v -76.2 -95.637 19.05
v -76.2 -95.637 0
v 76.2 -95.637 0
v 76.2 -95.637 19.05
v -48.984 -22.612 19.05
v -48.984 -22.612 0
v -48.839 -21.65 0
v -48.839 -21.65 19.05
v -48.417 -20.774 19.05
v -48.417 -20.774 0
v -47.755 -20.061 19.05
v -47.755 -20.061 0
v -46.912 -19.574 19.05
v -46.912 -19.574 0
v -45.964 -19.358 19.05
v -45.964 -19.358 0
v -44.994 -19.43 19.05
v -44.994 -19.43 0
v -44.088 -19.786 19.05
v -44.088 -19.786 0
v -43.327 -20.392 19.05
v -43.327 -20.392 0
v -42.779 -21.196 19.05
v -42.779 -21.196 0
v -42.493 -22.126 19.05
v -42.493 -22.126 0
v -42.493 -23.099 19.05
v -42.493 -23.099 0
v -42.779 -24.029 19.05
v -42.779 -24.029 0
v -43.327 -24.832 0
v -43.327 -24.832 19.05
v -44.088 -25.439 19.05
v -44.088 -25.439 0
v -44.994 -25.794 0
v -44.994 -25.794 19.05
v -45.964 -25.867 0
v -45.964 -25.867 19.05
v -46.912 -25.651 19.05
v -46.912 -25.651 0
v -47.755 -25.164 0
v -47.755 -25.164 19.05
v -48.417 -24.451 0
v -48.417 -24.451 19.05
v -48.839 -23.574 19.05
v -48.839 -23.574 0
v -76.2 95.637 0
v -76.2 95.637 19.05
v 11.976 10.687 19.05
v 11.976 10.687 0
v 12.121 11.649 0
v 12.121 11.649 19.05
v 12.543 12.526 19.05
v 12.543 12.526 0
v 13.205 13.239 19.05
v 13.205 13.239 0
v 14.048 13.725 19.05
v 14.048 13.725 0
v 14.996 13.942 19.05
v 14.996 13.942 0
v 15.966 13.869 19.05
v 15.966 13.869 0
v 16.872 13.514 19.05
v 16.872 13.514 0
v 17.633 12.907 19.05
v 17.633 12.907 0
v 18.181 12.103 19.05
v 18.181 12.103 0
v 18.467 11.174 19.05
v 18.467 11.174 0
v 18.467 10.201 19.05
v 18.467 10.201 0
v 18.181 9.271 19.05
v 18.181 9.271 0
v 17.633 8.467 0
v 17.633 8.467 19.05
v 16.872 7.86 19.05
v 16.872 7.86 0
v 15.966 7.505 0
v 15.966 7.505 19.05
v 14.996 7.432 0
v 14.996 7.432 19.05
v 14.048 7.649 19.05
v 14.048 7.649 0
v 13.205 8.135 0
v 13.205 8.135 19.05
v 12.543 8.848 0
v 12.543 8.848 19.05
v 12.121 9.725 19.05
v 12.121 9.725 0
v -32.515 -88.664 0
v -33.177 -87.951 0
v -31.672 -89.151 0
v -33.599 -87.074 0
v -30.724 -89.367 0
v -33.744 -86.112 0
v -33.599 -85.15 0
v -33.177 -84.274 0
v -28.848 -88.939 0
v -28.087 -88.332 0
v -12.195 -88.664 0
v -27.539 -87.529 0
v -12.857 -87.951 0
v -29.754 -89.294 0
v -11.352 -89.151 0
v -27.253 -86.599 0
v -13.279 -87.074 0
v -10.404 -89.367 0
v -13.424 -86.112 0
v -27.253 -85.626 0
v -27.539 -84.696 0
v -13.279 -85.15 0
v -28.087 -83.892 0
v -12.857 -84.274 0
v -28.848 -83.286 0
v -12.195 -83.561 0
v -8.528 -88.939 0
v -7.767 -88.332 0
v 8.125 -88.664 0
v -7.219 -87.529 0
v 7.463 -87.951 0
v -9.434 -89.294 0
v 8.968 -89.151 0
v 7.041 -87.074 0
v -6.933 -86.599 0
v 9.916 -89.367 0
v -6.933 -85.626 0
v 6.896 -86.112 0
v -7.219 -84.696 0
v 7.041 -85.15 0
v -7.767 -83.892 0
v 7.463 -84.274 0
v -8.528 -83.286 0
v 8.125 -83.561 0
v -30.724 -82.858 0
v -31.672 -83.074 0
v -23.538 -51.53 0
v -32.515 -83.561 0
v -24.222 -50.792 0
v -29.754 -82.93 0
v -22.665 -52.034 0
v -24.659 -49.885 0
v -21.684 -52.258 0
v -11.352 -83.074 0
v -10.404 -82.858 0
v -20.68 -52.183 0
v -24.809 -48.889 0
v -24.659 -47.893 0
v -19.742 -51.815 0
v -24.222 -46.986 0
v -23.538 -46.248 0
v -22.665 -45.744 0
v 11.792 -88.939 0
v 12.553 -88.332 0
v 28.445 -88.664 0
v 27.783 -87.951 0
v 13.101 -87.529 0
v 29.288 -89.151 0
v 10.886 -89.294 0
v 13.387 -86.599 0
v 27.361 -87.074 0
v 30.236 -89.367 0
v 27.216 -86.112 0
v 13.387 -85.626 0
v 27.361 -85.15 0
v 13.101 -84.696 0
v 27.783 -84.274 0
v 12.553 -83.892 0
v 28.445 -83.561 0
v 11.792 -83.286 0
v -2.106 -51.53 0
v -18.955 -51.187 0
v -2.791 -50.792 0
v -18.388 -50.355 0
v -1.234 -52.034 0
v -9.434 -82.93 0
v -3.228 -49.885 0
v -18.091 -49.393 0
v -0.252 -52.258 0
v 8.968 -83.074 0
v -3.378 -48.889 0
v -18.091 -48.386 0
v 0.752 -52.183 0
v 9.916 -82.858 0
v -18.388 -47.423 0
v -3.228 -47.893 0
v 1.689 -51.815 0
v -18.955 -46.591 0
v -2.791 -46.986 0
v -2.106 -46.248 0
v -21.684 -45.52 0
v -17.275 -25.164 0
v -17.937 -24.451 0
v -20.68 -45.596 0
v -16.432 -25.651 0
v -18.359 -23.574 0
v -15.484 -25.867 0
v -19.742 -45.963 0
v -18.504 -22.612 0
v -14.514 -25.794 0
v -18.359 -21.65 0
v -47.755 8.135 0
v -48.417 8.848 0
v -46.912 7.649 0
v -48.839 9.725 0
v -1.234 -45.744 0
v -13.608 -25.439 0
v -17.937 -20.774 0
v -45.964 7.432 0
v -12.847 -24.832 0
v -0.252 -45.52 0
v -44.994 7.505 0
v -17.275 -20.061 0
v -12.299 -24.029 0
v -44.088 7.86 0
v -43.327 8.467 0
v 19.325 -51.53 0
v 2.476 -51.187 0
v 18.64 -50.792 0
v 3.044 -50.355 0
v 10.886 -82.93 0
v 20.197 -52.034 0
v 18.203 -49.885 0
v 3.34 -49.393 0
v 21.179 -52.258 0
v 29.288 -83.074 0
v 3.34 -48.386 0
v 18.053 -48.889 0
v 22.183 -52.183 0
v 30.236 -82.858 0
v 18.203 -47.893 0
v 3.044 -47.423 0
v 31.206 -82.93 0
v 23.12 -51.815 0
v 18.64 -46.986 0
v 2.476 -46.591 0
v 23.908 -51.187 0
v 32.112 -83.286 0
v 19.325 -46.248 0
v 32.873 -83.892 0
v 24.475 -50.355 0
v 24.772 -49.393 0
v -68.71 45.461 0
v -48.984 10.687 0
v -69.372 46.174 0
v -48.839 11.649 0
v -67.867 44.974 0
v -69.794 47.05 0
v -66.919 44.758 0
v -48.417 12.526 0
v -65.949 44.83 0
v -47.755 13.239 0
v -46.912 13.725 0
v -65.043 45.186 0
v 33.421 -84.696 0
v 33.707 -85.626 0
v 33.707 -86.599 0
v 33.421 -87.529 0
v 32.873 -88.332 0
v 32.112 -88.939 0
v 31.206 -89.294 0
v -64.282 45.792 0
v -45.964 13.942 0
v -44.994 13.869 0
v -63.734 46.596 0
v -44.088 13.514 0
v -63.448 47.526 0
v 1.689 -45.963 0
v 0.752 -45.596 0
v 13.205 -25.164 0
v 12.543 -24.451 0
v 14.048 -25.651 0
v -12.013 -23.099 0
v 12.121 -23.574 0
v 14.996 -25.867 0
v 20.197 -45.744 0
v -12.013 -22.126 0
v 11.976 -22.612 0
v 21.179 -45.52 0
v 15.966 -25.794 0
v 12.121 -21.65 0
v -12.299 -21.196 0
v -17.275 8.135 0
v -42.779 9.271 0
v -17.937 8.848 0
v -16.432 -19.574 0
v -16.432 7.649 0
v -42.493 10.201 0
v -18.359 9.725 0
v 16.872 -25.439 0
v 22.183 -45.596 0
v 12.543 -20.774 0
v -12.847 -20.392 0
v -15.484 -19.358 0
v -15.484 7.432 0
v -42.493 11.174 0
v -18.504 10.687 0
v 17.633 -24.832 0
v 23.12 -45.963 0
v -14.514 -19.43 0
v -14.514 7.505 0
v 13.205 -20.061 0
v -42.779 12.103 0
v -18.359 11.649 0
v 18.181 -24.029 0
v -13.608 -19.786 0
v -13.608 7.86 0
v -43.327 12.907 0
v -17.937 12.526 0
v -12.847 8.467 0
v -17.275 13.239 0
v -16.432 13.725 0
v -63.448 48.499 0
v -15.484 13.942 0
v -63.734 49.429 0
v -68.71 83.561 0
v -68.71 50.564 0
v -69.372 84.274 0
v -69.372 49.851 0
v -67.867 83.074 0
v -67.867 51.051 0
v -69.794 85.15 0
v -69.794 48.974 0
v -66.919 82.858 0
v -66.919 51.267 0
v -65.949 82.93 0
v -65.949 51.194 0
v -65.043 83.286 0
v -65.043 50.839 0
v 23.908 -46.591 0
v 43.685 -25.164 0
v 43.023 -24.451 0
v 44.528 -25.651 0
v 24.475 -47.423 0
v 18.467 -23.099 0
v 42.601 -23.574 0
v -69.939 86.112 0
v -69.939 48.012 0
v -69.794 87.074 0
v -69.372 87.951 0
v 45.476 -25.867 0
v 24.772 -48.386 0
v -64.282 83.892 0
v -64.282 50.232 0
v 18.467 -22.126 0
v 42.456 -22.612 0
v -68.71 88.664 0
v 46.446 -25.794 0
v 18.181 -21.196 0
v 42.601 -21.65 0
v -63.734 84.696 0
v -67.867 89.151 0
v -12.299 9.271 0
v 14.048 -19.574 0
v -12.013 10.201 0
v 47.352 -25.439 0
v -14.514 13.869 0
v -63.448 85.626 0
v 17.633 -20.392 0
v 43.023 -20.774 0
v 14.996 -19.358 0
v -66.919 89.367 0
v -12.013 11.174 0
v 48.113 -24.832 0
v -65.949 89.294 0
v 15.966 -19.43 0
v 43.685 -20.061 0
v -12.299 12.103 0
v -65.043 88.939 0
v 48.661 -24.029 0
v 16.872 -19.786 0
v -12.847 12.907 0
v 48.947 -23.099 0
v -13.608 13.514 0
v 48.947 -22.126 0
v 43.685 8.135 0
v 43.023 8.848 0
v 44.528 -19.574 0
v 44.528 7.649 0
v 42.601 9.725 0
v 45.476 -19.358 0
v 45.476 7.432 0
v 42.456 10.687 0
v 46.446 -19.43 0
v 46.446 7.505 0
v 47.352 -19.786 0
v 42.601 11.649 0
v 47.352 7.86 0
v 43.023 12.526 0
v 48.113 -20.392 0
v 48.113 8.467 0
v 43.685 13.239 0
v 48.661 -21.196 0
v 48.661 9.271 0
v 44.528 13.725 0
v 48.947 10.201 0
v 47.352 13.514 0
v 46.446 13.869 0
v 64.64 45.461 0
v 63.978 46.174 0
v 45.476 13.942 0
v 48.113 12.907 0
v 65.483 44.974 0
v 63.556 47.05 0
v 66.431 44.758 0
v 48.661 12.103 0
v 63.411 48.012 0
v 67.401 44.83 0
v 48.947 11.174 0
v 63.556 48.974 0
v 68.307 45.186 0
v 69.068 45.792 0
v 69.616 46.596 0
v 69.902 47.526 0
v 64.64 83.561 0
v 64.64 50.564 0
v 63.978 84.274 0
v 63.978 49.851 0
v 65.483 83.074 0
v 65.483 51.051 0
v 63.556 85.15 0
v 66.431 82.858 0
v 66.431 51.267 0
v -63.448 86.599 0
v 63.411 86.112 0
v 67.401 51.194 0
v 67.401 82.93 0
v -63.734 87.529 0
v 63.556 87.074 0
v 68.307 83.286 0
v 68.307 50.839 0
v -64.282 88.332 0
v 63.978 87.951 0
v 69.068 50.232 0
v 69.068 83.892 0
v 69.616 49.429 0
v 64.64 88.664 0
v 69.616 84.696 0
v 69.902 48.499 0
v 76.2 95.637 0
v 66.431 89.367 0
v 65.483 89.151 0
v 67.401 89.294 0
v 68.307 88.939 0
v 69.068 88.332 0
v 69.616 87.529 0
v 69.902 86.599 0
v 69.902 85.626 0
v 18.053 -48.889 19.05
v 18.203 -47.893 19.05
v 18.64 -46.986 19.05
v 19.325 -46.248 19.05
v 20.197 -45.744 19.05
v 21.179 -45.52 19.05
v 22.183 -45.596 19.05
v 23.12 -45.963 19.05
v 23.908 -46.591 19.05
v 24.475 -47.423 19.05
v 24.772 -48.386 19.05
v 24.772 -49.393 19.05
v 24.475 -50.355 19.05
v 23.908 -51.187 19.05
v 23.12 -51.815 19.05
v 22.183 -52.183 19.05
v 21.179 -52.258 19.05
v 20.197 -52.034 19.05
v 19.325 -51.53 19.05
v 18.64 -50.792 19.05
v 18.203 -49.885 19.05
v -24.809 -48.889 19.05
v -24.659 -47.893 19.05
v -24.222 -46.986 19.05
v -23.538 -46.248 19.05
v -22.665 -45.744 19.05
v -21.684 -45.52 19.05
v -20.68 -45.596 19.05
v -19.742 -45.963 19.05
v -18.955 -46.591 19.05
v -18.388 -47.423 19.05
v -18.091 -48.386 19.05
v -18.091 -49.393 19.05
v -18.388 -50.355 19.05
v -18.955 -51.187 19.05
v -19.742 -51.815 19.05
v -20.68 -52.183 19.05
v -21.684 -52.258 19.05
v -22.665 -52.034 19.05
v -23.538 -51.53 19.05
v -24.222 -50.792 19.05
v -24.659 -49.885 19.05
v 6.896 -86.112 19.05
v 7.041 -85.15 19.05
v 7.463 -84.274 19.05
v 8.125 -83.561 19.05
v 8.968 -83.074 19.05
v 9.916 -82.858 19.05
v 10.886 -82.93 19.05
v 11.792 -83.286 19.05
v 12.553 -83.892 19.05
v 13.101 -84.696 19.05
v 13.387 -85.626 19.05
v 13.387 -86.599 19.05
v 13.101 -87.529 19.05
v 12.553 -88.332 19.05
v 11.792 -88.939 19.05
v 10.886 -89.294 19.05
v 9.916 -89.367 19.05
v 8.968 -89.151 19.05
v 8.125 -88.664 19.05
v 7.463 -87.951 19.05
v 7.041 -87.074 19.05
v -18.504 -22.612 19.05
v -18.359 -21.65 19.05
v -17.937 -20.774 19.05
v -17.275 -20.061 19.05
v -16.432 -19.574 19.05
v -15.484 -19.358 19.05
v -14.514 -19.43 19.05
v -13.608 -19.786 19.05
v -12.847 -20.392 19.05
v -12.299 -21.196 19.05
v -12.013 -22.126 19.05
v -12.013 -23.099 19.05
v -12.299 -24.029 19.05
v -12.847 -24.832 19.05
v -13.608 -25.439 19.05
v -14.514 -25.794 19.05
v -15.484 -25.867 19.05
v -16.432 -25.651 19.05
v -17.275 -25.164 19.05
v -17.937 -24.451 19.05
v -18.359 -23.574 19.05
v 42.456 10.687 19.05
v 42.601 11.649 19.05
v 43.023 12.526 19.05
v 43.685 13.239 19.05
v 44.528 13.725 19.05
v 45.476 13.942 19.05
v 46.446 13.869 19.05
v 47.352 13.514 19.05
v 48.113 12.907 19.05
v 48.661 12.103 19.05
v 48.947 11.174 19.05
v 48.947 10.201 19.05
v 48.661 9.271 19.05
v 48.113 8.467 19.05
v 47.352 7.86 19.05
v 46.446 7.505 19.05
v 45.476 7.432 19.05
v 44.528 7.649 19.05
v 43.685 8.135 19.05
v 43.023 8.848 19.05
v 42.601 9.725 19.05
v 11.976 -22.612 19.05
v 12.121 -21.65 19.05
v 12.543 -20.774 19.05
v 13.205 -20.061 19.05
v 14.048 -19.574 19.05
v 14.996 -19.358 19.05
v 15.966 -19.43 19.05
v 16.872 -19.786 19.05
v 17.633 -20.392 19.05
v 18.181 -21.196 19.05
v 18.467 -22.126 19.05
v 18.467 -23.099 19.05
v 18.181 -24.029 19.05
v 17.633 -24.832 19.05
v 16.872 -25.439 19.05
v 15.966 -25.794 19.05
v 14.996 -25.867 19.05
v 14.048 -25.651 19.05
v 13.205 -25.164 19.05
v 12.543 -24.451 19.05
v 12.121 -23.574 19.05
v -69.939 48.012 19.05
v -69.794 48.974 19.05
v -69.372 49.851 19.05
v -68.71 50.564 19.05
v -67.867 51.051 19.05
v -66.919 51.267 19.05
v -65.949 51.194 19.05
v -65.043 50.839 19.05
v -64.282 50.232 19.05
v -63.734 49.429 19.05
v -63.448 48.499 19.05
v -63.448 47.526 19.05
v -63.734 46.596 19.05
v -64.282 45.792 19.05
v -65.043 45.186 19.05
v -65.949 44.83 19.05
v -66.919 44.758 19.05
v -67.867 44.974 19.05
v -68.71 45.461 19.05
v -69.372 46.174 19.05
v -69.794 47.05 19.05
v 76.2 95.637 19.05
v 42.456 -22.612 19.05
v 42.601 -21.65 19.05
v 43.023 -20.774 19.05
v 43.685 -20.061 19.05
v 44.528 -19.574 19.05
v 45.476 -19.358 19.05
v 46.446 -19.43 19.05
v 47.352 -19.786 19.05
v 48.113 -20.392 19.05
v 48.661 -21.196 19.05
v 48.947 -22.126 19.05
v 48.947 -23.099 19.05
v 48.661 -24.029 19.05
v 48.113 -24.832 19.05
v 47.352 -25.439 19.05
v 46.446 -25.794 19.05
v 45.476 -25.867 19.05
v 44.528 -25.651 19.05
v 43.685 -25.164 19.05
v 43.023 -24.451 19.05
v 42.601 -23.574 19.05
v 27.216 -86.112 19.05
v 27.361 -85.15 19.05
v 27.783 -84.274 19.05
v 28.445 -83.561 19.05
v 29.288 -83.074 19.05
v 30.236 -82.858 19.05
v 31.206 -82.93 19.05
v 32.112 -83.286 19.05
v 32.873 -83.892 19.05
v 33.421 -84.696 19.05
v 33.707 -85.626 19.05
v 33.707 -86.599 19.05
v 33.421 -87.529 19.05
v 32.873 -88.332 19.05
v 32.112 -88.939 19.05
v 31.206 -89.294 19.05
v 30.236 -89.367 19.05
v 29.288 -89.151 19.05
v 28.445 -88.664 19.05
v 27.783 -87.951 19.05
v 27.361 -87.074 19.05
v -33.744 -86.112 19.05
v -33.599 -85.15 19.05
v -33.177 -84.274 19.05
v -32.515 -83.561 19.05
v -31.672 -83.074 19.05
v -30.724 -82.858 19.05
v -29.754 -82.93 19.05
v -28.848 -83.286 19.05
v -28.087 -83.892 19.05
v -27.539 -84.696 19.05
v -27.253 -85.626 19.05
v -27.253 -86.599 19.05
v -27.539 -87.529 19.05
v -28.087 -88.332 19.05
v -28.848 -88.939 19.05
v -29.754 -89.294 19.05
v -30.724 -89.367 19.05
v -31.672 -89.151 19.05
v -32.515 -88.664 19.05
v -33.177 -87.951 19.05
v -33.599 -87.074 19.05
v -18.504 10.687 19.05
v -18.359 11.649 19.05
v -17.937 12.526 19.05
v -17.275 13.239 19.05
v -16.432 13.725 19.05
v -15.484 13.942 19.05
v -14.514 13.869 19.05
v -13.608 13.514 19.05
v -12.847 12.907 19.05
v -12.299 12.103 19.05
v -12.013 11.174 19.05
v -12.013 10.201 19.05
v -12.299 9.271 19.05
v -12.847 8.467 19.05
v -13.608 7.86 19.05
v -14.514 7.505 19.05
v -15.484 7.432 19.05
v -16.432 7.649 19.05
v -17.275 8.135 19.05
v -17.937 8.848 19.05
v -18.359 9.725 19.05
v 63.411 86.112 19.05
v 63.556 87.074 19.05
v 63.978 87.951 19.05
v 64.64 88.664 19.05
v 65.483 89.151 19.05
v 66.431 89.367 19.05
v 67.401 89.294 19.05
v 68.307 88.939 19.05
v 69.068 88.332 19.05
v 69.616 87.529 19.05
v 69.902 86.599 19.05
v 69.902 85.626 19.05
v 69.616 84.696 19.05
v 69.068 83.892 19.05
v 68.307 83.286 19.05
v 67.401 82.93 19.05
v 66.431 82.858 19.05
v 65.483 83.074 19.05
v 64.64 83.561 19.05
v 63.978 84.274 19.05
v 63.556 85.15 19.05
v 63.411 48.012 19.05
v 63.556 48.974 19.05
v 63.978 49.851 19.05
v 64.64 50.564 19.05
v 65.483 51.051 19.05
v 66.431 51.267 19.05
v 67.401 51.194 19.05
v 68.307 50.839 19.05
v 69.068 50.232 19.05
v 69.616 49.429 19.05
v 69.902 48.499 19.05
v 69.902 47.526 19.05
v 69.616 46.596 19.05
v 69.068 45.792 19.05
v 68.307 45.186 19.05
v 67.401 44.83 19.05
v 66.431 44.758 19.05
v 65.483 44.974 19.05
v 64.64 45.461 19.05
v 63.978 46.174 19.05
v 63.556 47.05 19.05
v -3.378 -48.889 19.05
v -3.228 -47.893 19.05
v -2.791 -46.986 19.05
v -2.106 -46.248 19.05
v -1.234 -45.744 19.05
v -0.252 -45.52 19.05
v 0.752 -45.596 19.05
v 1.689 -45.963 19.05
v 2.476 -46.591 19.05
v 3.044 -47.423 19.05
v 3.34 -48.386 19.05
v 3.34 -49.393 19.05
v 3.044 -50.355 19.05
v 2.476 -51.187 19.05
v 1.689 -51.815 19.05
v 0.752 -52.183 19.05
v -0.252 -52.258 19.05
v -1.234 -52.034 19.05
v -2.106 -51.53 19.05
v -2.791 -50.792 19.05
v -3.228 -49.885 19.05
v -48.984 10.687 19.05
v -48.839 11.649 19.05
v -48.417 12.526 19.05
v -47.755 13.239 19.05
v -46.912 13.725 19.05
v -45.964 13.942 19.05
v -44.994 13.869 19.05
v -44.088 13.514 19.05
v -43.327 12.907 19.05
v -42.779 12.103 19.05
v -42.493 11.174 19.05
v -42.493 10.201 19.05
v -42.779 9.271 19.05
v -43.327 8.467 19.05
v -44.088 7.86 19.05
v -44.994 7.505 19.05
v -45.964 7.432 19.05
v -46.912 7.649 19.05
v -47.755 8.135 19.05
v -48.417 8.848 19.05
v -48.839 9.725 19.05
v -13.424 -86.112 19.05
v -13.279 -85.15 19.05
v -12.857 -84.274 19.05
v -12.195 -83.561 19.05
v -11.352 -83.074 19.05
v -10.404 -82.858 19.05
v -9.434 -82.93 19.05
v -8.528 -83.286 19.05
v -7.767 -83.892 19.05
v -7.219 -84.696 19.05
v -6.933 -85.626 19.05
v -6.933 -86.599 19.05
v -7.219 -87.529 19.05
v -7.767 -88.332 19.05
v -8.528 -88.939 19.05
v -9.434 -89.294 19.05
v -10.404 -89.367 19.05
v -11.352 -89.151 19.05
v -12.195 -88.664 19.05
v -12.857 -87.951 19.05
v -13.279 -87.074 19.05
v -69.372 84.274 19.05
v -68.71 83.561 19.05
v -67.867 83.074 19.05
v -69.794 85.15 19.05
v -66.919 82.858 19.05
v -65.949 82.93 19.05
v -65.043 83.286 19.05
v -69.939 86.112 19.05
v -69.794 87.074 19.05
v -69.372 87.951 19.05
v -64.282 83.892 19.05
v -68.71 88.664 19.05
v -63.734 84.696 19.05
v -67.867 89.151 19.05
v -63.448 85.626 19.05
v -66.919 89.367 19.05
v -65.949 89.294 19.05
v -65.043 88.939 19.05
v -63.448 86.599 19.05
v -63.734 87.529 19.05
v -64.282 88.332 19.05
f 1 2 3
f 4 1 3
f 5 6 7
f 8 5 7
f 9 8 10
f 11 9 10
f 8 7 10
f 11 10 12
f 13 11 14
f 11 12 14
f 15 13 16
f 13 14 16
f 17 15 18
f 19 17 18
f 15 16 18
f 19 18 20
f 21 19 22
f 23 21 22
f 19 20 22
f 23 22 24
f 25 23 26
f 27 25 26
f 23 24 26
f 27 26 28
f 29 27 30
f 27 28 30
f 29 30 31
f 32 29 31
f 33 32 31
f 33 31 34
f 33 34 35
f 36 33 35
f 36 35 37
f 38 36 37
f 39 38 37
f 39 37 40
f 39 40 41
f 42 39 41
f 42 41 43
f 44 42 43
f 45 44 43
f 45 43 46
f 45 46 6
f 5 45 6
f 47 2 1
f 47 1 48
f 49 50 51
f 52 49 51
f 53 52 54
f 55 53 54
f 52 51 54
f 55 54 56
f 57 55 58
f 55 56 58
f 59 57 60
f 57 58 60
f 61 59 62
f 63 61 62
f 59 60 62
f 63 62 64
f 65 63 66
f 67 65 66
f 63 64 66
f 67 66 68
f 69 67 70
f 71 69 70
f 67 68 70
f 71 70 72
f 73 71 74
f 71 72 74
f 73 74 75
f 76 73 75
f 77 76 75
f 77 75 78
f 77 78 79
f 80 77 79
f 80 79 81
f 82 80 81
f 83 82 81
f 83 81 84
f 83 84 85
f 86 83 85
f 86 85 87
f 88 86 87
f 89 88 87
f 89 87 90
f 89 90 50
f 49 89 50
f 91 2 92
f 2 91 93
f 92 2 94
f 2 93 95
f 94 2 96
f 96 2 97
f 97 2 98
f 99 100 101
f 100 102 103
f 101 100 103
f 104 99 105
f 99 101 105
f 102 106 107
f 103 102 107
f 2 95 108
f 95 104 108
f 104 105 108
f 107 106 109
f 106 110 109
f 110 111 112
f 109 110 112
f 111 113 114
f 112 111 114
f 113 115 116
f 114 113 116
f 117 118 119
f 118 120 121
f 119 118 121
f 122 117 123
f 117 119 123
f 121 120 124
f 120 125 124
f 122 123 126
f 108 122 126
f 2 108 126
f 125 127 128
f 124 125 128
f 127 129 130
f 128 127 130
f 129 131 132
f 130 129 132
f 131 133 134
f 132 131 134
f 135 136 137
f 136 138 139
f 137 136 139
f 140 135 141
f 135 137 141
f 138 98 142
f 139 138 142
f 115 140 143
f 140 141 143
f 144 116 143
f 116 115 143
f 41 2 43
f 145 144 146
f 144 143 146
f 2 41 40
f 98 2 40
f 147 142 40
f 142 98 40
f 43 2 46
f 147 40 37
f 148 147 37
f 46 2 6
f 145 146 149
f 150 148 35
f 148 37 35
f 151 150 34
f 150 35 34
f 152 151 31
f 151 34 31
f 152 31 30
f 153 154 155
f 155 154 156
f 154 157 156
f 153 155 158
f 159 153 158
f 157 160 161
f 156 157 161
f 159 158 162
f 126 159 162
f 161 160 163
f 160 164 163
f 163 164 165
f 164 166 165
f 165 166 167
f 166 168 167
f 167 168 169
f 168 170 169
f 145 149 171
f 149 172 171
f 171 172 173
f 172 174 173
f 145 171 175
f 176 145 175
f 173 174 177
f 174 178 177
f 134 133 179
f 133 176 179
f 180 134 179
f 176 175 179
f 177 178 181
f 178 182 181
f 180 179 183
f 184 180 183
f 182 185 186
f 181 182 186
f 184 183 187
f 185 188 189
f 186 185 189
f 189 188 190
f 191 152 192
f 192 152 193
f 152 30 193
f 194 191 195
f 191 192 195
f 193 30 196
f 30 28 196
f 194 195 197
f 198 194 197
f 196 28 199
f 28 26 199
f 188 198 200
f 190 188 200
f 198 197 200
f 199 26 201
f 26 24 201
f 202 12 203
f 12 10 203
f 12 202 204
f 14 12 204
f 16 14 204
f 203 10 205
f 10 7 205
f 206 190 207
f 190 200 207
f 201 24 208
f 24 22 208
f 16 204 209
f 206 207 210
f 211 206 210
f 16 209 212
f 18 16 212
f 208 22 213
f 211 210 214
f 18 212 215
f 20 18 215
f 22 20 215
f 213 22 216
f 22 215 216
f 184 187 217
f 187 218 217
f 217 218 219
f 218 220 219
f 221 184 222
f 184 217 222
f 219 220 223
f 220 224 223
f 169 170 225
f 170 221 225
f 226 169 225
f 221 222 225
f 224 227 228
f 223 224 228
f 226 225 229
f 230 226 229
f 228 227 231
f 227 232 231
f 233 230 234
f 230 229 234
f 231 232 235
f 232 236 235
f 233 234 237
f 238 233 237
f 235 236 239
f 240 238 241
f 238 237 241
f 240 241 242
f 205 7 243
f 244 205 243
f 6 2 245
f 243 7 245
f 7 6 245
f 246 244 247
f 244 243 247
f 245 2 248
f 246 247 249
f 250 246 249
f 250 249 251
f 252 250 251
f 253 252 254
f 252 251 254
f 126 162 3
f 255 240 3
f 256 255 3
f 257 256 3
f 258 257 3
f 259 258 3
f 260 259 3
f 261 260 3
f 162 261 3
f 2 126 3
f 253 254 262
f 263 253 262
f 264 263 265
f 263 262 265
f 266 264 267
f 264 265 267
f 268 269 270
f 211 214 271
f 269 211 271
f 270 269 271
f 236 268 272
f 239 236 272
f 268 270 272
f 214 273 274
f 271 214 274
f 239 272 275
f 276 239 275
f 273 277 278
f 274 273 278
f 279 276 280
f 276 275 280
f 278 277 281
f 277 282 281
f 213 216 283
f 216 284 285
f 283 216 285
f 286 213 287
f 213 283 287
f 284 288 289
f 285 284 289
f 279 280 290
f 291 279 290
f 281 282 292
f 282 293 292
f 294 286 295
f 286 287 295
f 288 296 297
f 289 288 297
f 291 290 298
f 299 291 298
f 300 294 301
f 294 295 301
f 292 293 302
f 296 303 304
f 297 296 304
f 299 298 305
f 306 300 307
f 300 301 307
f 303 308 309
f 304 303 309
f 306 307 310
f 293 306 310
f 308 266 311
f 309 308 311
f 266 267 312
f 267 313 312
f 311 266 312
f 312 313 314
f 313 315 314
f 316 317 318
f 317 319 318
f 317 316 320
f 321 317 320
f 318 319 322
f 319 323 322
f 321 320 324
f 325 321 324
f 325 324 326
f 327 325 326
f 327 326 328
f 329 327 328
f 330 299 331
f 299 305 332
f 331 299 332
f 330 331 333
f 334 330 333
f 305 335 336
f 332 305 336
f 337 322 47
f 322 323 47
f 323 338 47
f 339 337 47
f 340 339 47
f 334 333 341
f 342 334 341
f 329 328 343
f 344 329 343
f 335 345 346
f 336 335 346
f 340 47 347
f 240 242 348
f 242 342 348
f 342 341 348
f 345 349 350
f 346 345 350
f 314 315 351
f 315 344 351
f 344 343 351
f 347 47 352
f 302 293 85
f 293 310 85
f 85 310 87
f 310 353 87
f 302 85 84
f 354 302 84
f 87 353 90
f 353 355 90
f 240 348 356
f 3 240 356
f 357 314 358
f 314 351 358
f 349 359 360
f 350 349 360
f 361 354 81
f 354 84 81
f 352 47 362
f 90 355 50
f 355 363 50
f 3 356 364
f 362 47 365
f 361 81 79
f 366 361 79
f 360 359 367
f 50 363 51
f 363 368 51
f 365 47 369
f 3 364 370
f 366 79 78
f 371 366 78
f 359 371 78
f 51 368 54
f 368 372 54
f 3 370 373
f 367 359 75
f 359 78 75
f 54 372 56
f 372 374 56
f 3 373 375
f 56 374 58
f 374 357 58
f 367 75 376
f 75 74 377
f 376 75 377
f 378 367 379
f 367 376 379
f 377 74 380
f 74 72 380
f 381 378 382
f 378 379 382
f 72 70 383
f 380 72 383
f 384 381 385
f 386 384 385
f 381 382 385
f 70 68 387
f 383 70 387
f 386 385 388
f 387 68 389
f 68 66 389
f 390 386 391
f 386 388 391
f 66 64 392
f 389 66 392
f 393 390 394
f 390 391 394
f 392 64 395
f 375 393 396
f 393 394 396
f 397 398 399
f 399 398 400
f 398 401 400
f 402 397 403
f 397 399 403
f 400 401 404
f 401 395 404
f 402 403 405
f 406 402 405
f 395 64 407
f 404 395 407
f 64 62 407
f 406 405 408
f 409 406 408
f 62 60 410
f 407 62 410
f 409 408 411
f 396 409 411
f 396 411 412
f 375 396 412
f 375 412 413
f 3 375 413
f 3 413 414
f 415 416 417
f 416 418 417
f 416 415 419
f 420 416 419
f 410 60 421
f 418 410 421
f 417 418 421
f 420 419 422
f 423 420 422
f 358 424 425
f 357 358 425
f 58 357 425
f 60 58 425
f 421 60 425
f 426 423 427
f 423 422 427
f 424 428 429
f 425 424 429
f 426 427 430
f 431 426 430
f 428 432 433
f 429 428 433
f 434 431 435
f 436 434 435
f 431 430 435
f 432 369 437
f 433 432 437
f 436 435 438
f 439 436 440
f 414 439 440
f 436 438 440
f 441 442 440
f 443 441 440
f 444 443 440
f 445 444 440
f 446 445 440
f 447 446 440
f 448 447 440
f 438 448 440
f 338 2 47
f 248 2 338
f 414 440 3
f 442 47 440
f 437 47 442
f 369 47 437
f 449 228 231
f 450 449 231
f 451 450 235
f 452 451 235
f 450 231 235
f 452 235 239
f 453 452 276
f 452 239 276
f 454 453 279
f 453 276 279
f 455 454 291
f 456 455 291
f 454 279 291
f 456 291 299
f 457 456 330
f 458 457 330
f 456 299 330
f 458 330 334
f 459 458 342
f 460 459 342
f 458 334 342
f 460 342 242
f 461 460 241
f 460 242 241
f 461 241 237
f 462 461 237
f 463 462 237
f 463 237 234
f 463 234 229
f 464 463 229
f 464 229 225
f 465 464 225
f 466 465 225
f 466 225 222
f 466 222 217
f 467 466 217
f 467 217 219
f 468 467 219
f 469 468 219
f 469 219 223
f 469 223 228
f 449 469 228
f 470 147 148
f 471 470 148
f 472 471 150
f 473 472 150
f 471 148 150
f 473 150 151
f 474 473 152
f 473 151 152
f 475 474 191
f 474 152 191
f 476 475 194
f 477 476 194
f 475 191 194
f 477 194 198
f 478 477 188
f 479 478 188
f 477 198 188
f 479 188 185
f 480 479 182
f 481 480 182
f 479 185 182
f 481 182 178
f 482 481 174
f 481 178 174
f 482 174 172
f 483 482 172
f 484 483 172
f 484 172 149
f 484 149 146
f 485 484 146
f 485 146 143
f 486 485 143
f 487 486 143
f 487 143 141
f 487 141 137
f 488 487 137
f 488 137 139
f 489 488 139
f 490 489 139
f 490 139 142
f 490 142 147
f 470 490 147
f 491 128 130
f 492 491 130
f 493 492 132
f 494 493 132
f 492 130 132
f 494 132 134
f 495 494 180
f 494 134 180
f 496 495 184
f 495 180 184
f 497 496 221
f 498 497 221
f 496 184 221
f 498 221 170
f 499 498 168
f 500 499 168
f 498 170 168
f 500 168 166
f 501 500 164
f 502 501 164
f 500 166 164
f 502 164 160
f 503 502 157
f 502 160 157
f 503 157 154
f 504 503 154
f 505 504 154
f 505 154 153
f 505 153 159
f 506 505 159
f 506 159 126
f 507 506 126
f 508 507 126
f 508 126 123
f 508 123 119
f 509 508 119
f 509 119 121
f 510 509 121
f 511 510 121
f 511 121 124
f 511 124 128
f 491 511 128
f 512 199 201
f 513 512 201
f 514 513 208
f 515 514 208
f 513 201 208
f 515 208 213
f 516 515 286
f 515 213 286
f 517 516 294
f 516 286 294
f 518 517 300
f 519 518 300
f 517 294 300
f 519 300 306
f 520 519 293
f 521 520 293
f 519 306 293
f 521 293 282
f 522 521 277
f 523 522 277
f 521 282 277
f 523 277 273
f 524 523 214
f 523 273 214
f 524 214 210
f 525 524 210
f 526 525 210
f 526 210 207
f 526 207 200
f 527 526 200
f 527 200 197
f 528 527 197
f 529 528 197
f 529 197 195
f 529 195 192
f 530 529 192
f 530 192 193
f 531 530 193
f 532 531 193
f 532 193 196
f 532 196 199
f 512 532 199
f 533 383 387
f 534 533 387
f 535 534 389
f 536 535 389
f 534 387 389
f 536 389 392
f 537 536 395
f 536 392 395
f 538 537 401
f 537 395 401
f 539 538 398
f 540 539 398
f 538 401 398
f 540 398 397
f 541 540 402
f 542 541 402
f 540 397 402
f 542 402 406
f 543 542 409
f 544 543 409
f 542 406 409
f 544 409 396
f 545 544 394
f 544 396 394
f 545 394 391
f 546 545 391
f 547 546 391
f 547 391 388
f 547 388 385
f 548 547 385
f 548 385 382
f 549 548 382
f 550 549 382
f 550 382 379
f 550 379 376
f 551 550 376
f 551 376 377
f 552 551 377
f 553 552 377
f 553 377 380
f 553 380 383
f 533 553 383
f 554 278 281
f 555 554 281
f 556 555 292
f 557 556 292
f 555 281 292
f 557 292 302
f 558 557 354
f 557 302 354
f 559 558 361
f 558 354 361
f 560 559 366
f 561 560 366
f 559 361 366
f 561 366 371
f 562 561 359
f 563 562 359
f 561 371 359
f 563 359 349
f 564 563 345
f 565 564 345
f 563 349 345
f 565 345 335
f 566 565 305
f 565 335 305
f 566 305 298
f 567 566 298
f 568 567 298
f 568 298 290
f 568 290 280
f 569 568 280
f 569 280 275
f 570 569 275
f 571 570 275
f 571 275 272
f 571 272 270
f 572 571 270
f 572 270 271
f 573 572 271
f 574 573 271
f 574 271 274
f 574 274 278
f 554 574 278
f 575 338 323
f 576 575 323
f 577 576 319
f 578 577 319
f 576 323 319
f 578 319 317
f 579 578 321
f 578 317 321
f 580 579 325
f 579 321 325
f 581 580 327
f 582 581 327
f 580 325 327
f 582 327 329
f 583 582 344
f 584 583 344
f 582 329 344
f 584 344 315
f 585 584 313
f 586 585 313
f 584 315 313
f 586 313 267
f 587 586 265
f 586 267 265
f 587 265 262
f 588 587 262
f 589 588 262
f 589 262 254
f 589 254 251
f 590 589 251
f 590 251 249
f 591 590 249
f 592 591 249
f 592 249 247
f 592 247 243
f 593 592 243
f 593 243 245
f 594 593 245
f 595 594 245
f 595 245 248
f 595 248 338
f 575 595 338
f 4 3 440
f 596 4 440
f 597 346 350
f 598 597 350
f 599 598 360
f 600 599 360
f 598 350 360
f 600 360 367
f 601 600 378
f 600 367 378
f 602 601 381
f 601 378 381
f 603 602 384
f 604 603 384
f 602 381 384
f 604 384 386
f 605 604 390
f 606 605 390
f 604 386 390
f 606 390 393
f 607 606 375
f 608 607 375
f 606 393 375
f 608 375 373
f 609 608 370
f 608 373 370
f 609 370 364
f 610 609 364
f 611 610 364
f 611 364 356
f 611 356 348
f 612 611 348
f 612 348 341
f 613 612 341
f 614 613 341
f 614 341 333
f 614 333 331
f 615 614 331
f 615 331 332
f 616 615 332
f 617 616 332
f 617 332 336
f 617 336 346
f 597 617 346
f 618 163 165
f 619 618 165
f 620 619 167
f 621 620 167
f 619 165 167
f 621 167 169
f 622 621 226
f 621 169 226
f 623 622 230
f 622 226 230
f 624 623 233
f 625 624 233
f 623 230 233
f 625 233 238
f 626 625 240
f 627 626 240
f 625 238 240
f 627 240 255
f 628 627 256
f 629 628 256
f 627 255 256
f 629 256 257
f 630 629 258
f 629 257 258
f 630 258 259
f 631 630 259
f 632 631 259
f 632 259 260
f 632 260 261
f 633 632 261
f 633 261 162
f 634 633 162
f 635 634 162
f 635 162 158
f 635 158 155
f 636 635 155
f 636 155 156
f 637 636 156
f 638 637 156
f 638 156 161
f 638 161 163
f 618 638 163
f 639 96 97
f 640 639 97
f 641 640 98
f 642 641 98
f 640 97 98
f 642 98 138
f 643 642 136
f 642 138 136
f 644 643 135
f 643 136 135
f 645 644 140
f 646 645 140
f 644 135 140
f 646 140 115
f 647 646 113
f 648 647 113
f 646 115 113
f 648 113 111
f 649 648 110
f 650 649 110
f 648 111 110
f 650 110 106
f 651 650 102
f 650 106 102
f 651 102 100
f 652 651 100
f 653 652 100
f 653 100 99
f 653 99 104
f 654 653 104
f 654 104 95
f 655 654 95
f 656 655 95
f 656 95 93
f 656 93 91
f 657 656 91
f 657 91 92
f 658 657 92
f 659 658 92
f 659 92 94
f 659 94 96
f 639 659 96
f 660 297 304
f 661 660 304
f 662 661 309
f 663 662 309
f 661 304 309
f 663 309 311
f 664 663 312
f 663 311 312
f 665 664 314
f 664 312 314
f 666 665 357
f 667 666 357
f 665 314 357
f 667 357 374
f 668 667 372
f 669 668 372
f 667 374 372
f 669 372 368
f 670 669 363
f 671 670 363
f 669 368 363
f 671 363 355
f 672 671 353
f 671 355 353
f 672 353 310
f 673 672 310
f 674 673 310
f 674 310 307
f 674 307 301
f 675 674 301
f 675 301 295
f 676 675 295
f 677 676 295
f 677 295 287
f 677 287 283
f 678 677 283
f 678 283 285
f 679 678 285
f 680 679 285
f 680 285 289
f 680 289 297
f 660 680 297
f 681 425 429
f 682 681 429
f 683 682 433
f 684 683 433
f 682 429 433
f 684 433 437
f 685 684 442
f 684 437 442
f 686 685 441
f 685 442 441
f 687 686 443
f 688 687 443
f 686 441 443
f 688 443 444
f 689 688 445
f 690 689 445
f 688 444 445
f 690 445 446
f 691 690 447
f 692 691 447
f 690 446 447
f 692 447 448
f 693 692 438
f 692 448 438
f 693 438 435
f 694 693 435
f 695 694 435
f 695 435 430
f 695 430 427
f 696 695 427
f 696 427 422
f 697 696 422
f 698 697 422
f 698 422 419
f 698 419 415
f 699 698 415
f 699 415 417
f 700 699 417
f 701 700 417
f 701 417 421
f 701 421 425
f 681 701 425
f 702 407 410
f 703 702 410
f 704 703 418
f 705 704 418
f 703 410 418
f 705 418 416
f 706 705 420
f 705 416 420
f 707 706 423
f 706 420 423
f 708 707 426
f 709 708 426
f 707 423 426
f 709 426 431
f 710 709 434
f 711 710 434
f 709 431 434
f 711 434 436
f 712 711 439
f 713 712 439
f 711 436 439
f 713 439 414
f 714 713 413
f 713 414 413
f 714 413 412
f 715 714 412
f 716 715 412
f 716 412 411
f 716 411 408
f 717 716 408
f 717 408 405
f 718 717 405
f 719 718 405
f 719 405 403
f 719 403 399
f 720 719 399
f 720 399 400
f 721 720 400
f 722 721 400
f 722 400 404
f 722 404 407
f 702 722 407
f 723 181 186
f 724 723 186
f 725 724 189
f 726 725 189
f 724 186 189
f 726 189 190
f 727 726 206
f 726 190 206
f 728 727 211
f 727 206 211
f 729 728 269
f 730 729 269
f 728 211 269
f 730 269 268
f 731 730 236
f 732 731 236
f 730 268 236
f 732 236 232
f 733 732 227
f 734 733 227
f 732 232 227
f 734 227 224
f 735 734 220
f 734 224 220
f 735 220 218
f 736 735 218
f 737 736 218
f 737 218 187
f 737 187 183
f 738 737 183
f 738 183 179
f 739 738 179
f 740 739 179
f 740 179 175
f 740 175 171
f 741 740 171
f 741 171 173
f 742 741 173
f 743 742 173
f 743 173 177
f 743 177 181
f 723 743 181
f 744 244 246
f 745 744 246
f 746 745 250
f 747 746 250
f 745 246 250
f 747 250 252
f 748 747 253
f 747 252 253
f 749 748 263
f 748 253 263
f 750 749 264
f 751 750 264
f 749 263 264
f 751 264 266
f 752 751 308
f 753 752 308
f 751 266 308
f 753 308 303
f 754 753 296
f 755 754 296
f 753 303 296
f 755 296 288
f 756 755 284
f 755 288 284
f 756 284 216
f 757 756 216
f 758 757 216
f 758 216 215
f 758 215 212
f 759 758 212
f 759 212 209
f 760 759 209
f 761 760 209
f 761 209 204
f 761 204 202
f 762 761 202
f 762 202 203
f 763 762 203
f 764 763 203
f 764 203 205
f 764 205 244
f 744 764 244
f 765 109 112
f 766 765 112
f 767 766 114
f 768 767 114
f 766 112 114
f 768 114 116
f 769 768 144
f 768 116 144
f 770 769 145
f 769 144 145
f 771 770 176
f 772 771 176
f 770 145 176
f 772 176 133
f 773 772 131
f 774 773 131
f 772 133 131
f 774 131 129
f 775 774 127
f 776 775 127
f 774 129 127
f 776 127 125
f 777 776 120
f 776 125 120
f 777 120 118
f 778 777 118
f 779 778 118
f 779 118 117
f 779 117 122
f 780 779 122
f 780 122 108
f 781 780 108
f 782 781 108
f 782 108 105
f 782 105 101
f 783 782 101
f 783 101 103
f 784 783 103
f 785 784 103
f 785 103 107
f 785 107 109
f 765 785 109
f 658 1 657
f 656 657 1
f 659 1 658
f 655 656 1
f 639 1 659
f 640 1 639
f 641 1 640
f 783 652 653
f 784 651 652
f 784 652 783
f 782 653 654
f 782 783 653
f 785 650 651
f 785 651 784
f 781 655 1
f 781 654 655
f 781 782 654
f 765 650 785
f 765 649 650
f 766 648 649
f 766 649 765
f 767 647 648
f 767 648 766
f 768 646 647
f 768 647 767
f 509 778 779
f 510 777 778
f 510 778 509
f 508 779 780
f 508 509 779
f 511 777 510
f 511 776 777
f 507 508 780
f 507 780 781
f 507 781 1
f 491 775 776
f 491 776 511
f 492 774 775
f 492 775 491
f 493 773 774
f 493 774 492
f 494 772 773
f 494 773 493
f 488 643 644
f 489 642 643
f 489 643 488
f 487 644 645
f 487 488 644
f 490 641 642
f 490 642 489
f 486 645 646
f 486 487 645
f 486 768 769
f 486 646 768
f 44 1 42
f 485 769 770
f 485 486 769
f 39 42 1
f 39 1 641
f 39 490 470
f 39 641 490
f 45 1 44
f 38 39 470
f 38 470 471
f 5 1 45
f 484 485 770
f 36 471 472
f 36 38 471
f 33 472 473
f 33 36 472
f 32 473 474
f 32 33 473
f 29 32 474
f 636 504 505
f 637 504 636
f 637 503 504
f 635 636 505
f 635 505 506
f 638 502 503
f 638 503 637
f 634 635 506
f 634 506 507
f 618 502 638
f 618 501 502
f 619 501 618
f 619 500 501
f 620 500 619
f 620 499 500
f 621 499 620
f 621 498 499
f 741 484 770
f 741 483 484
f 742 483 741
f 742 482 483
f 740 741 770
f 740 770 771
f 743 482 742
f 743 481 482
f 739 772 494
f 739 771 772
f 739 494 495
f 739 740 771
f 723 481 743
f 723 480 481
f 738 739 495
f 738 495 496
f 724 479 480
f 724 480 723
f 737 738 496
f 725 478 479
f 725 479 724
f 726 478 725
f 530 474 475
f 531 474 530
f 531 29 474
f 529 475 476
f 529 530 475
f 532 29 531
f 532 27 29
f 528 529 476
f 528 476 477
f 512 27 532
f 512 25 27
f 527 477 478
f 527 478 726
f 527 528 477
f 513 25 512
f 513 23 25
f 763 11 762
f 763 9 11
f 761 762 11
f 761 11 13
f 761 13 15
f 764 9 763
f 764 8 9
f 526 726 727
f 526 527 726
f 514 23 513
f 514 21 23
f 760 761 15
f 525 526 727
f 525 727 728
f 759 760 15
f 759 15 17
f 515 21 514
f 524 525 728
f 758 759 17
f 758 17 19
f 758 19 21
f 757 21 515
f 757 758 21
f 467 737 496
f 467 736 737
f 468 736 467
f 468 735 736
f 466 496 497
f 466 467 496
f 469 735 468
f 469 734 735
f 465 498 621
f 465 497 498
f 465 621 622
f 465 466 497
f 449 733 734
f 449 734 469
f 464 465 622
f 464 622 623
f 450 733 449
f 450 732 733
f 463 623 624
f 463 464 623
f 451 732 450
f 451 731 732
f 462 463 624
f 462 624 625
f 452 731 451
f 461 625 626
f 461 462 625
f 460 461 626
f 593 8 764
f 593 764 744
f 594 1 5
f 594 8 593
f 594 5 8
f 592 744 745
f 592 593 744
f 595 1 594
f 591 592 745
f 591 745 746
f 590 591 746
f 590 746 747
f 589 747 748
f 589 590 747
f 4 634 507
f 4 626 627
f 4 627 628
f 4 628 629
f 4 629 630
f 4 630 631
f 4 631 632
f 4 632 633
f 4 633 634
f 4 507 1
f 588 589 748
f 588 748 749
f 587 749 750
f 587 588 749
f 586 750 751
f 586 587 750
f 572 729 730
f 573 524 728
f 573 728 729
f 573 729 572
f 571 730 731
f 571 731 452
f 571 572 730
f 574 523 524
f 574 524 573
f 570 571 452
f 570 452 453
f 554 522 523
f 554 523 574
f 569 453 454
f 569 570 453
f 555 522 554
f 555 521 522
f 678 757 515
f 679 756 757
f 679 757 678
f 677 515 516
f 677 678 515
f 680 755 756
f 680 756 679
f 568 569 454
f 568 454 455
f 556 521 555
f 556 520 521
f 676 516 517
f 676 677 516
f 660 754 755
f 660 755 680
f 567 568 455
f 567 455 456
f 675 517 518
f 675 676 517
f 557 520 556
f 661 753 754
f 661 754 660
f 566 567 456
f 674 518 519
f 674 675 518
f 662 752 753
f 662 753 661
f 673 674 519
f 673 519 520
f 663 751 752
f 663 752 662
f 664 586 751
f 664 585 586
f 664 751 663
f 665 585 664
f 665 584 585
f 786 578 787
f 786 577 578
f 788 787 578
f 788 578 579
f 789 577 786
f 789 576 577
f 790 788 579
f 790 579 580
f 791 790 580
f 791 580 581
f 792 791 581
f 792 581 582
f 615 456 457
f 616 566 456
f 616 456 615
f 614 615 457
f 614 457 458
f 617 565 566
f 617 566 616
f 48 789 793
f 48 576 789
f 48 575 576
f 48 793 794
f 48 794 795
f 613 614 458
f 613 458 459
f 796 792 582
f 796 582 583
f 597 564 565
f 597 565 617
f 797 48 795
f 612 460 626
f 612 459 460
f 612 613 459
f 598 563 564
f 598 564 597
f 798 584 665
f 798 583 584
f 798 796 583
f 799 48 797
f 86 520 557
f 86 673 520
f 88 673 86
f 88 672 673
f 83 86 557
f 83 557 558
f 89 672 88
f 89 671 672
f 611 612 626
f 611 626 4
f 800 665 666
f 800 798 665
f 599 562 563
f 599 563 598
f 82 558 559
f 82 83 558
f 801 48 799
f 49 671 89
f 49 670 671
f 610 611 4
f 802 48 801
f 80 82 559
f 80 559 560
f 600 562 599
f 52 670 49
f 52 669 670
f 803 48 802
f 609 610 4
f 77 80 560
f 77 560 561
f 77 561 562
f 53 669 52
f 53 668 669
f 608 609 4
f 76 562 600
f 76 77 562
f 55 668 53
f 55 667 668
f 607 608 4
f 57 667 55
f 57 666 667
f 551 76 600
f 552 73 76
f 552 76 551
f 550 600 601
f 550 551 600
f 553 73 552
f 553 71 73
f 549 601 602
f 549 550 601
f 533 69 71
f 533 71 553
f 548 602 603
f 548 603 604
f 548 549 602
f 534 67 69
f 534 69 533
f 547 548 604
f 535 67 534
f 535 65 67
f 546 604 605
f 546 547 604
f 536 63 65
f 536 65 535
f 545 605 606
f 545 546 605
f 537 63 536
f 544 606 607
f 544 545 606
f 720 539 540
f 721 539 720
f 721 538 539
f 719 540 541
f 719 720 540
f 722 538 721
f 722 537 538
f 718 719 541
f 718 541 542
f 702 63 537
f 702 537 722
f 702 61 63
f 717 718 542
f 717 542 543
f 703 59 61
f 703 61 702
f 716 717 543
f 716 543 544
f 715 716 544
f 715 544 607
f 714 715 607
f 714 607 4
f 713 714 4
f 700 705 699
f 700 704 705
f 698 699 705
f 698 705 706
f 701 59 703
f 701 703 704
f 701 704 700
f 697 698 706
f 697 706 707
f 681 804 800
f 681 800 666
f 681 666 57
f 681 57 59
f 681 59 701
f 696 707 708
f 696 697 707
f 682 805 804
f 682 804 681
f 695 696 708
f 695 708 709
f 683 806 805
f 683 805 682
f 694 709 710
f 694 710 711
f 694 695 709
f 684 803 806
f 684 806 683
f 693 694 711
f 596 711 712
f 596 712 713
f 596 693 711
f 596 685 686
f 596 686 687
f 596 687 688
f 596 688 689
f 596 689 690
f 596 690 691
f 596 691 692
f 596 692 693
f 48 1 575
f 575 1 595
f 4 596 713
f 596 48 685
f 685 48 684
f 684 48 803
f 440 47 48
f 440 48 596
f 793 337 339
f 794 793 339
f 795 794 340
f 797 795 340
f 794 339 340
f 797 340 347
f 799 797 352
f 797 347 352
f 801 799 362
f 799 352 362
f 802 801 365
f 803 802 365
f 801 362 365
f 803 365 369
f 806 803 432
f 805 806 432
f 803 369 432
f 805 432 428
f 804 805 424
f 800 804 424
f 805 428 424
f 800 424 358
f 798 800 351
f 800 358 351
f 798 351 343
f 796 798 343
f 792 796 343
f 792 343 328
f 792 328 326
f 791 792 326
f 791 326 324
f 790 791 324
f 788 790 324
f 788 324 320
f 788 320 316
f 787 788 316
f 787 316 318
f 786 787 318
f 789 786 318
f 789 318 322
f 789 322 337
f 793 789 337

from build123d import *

# Parameters (mm, degrees)
F0_W     = 152.4
F0_H     = 191.2747
F1_DEPTH = 19.05
F3_D     = 6.5278
F6_D     = 6.7564


with BuildPart() as f1:
    # F0 (on Top) → F1 (new body)
    with BuildSketch(Plane.XY):
        Rectangle(F0_W, F0_H)
    extrude(amount=F1_DEPTH)

    # F3 (through all)
    with Locations(Plane.XY.offset(19.05)):
        with Locations((-30.48, -86.11235), (-10.16, -86.11235), (10.16, -86.11235), (30.48, -86.11235), (-66.675, 48.01235), (-66.675, 86.11235), (66.675, 86.11235), (66.675, 48.01235), (-45.72, 10.68705), (-45.72, -22.61235), (-15.24, -22.61235), (-15.24, 10.68705), (15.24, 10.68705), (15.24, -22.61235), (45.72, -22.61235), (45.72, 10.68705)):
            Hole(F3_D / 2)

    # F6 (through all)
    with Locations(Plane.XY.offset(19.05)):
        with Locations((0, -48.8890202521), (-21.43125, -48.8890202521), (21.43125, -48.8890202521)):
            Hole(F6_D / 2)


solid = f1.part
